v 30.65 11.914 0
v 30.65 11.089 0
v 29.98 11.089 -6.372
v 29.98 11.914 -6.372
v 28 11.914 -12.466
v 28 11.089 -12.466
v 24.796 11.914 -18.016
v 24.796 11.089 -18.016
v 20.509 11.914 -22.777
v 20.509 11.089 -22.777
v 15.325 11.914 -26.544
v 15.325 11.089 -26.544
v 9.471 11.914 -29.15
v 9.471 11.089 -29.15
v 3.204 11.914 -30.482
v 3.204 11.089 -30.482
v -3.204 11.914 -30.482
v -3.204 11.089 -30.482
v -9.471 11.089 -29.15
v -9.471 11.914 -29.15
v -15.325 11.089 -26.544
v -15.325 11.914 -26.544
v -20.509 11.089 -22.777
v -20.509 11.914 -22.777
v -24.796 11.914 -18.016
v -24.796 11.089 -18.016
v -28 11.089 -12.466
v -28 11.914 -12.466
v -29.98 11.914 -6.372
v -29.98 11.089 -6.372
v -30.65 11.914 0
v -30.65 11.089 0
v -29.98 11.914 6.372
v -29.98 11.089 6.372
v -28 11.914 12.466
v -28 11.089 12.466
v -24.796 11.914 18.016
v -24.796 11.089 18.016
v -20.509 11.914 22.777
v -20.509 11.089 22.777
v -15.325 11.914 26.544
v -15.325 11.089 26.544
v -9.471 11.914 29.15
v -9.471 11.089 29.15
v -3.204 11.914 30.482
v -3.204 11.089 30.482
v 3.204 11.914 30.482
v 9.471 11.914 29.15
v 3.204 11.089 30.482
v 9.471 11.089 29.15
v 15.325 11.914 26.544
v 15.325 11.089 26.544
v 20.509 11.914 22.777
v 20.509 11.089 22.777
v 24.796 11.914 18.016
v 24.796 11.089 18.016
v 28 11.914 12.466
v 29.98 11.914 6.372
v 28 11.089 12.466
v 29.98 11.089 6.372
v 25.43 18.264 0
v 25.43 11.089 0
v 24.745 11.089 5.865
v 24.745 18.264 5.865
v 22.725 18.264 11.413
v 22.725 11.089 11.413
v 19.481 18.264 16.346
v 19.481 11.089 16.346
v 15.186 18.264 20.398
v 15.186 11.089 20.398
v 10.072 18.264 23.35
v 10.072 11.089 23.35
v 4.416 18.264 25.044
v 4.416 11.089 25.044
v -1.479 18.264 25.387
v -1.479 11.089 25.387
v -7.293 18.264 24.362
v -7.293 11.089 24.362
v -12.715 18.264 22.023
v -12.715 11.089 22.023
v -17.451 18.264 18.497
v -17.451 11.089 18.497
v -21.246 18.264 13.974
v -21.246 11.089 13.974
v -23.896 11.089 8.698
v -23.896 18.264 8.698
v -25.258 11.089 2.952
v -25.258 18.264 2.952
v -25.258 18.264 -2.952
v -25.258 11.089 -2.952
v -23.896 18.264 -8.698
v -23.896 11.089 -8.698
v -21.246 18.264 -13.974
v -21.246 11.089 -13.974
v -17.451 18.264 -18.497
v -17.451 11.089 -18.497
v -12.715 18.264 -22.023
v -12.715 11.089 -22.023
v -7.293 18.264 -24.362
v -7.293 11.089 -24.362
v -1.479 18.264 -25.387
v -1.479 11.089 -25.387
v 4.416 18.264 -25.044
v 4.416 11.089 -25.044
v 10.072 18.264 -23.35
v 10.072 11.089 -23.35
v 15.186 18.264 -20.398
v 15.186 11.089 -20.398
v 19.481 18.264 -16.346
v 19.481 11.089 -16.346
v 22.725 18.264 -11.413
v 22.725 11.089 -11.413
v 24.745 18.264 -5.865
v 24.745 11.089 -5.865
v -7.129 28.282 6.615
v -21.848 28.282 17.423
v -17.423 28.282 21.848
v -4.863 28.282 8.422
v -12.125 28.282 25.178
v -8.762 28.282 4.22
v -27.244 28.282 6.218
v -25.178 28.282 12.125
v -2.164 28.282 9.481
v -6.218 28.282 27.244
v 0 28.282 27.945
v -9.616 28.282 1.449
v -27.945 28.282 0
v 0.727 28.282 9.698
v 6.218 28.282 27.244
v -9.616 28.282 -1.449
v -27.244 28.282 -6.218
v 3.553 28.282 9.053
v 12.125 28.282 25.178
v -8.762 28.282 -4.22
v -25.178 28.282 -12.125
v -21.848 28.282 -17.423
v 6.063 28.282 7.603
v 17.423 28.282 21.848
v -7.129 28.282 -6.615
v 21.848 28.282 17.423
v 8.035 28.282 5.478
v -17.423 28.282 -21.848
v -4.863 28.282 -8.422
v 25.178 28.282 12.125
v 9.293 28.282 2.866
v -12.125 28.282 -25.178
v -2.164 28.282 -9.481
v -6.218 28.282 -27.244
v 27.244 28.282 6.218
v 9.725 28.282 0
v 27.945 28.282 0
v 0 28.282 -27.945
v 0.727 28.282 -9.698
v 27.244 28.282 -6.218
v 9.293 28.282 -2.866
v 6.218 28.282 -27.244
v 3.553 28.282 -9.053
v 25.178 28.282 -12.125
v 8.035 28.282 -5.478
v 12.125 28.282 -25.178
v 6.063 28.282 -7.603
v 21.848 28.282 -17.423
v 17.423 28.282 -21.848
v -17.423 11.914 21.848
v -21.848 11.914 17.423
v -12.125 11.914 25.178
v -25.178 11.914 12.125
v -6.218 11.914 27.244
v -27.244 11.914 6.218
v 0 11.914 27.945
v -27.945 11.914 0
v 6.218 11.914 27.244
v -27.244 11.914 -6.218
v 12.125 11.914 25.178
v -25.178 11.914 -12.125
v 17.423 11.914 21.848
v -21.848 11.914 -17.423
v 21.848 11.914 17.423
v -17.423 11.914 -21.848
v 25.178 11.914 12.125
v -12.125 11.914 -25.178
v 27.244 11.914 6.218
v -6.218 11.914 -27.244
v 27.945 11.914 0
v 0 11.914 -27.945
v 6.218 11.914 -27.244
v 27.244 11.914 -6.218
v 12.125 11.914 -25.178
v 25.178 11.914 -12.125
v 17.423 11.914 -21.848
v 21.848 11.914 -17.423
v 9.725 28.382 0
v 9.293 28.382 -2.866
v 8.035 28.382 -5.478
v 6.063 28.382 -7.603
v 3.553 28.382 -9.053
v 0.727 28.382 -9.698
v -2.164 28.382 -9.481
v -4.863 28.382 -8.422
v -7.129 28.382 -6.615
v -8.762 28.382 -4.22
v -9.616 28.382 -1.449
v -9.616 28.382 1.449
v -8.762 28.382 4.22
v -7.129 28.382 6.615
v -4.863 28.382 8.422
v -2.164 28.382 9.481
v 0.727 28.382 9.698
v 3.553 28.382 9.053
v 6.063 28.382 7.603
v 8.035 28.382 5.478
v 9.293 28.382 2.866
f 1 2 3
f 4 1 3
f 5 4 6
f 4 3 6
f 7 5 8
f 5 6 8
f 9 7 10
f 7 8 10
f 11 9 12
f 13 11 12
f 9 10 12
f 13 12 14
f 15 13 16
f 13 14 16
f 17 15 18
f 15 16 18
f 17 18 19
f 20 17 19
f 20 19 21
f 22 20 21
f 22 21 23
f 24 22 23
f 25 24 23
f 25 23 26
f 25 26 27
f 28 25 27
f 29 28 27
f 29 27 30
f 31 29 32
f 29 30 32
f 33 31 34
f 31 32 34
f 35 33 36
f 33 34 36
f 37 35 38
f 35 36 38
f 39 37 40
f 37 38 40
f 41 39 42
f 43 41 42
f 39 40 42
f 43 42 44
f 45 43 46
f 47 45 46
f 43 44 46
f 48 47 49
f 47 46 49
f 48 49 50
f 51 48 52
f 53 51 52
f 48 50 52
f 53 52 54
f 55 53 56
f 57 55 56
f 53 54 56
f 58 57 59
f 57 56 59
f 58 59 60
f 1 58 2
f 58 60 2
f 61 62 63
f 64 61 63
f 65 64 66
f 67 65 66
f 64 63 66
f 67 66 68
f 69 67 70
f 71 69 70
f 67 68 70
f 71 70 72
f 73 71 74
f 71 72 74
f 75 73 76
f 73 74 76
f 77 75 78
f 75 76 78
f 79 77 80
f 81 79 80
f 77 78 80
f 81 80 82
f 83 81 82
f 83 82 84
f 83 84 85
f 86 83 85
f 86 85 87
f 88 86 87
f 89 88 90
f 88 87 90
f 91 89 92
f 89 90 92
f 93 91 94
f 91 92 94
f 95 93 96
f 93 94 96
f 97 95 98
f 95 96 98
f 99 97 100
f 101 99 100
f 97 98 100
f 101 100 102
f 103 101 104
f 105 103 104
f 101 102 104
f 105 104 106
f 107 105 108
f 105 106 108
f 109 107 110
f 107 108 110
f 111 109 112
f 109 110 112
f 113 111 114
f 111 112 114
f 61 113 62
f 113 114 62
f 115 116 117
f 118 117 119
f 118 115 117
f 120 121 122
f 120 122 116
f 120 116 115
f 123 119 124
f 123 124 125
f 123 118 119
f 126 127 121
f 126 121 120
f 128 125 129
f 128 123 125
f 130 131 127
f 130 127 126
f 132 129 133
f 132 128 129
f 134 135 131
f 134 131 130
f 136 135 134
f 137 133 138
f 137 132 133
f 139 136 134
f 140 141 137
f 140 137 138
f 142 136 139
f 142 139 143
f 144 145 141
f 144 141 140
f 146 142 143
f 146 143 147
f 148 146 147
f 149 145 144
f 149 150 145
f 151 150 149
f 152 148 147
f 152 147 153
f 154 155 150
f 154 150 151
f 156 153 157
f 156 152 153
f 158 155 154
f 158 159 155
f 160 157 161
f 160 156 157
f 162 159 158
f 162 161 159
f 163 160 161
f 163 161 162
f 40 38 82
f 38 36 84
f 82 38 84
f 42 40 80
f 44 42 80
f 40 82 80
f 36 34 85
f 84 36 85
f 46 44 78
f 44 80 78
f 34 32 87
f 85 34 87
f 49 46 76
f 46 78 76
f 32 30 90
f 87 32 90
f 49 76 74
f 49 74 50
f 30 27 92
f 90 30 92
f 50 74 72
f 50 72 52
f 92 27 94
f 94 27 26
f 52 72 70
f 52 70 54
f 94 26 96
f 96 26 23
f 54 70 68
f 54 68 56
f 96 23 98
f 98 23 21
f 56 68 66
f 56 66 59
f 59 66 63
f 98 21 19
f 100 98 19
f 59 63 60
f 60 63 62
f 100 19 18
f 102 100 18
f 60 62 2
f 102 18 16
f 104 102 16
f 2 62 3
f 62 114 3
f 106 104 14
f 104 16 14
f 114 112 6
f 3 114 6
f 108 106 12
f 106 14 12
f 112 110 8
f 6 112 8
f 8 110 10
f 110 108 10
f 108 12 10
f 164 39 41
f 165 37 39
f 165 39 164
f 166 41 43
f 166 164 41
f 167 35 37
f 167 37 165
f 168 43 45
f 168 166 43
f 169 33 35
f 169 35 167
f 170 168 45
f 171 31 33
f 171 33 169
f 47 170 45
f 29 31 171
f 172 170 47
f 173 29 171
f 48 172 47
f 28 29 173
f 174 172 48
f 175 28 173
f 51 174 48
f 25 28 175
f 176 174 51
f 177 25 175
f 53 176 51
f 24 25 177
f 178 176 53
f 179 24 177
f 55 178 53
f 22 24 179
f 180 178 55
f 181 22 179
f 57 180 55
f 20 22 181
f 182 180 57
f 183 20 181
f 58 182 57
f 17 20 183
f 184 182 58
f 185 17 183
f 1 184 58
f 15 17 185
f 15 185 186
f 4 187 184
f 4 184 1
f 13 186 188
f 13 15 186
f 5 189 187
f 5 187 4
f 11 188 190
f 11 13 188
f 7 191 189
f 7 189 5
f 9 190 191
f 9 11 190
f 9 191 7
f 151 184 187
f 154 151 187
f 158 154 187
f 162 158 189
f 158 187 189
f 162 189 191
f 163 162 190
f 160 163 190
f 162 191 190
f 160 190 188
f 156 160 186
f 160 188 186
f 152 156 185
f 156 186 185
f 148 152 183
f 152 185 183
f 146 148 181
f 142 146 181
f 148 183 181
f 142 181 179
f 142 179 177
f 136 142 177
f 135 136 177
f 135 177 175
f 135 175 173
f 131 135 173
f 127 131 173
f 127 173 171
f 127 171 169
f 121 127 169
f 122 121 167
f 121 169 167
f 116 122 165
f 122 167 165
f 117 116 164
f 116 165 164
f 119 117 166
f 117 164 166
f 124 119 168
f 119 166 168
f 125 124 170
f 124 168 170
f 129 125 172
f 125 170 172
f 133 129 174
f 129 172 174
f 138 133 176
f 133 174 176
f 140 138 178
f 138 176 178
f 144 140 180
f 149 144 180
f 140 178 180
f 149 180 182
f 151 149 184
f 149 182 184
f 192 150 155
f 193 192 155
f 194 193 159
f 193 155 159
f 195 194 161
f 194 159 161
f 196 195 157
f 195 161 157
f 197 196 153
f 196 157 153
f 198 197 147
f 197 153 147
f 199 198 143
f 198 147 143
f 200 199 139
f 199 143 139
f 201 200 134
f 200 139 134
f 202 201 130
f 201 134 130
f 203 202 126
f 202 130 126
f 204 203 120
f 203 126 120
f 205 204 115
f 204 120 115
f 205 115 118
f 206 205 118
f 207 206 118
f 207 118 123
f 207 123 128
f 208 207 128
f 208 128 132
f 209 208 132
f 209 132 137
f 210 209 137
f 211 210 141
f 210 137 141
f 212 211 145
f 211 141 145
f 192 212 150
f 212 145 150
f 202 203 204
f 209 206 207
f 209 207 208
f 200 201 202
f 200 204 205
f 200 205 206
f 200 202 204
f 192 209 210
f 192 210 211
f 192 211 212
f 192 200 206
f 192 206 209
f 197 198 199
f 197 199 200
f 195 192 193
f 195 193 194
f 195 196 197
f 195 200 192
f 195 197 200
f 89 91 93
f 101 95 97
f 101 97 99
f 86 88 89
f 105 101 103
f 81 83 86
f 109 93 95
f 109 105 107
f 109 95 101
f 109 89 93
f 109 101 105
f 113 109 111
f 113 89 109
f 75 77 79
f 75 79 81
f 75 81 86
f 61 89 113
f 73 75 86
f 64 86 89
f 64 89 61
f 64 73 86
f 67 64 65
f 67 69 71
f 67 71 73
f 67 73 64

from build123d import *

# Parameters (mm, degrees)
SKETCH1_R           = 61.3
BOSS_EXTRUDE1_DEPTH = 1.65
SKETCH2_R           = 55.89
BOSS_EXTRUDE2_DEPTH = 32.735
SKETCH3_R           = 50.86
CUT_EXTRUDE1_DEPTH  = 14.35
SKETCH5_R           = 19.45
BOSS_EXTRUDE3_DEPTH = 0.2
SCALE2_SCALE        = 0.5


with BuildPart() as part:
    # Sketch1 → Boss-Extrude1 (new body)
    with BuildSketch(Plane(origin=(0, 0, 0), x_dir=(1, 0, 0), z_dir=(0, 1, 0))):
        Circle(SKETCH1_R)
    extrude(amount=BOSS_EXTRUDE1_DEPTH)

    # Sketch2 → Boss-Extrude2 (add)
    with BuildSketch(Plane(origin=(0, 1.65, 0), x_dir=(1, 0, 0), z_dir=(0, 1, 0))):
        Circle(SKETCH2_R)
    extrude(amount=BOSS_EXTRUDE2_DEPTH)

    # Sketch3 → Cut-Extrude1 (cut)
    with BuildSketch(Plane.XZ):
        Circle(SKETCH3_R)
    extrude(amount=-CUT_EXTRUDE1_DEPTH, mode=Mode.SUBTRACT)

    # Sketch5 → Boss-Extrude3 (add)
    with BuildSketch(Plane(origin=(0, 34.385, 0), x_dir=(1, 0, 0), z_dir=(0, 1, 0))):
        Circle(SKETCH5_R)
    extrude(amount=BOSS_EXTRUDE3_DEPTH)


with BuildPart() as part_1:
    # Scale2: scaled about (0, 22.178245993, 0)
    add(part.part.scale(SCALE2_SCALE).moved(Location((0, 11.089122997, 0))))


solid = part_1.part
